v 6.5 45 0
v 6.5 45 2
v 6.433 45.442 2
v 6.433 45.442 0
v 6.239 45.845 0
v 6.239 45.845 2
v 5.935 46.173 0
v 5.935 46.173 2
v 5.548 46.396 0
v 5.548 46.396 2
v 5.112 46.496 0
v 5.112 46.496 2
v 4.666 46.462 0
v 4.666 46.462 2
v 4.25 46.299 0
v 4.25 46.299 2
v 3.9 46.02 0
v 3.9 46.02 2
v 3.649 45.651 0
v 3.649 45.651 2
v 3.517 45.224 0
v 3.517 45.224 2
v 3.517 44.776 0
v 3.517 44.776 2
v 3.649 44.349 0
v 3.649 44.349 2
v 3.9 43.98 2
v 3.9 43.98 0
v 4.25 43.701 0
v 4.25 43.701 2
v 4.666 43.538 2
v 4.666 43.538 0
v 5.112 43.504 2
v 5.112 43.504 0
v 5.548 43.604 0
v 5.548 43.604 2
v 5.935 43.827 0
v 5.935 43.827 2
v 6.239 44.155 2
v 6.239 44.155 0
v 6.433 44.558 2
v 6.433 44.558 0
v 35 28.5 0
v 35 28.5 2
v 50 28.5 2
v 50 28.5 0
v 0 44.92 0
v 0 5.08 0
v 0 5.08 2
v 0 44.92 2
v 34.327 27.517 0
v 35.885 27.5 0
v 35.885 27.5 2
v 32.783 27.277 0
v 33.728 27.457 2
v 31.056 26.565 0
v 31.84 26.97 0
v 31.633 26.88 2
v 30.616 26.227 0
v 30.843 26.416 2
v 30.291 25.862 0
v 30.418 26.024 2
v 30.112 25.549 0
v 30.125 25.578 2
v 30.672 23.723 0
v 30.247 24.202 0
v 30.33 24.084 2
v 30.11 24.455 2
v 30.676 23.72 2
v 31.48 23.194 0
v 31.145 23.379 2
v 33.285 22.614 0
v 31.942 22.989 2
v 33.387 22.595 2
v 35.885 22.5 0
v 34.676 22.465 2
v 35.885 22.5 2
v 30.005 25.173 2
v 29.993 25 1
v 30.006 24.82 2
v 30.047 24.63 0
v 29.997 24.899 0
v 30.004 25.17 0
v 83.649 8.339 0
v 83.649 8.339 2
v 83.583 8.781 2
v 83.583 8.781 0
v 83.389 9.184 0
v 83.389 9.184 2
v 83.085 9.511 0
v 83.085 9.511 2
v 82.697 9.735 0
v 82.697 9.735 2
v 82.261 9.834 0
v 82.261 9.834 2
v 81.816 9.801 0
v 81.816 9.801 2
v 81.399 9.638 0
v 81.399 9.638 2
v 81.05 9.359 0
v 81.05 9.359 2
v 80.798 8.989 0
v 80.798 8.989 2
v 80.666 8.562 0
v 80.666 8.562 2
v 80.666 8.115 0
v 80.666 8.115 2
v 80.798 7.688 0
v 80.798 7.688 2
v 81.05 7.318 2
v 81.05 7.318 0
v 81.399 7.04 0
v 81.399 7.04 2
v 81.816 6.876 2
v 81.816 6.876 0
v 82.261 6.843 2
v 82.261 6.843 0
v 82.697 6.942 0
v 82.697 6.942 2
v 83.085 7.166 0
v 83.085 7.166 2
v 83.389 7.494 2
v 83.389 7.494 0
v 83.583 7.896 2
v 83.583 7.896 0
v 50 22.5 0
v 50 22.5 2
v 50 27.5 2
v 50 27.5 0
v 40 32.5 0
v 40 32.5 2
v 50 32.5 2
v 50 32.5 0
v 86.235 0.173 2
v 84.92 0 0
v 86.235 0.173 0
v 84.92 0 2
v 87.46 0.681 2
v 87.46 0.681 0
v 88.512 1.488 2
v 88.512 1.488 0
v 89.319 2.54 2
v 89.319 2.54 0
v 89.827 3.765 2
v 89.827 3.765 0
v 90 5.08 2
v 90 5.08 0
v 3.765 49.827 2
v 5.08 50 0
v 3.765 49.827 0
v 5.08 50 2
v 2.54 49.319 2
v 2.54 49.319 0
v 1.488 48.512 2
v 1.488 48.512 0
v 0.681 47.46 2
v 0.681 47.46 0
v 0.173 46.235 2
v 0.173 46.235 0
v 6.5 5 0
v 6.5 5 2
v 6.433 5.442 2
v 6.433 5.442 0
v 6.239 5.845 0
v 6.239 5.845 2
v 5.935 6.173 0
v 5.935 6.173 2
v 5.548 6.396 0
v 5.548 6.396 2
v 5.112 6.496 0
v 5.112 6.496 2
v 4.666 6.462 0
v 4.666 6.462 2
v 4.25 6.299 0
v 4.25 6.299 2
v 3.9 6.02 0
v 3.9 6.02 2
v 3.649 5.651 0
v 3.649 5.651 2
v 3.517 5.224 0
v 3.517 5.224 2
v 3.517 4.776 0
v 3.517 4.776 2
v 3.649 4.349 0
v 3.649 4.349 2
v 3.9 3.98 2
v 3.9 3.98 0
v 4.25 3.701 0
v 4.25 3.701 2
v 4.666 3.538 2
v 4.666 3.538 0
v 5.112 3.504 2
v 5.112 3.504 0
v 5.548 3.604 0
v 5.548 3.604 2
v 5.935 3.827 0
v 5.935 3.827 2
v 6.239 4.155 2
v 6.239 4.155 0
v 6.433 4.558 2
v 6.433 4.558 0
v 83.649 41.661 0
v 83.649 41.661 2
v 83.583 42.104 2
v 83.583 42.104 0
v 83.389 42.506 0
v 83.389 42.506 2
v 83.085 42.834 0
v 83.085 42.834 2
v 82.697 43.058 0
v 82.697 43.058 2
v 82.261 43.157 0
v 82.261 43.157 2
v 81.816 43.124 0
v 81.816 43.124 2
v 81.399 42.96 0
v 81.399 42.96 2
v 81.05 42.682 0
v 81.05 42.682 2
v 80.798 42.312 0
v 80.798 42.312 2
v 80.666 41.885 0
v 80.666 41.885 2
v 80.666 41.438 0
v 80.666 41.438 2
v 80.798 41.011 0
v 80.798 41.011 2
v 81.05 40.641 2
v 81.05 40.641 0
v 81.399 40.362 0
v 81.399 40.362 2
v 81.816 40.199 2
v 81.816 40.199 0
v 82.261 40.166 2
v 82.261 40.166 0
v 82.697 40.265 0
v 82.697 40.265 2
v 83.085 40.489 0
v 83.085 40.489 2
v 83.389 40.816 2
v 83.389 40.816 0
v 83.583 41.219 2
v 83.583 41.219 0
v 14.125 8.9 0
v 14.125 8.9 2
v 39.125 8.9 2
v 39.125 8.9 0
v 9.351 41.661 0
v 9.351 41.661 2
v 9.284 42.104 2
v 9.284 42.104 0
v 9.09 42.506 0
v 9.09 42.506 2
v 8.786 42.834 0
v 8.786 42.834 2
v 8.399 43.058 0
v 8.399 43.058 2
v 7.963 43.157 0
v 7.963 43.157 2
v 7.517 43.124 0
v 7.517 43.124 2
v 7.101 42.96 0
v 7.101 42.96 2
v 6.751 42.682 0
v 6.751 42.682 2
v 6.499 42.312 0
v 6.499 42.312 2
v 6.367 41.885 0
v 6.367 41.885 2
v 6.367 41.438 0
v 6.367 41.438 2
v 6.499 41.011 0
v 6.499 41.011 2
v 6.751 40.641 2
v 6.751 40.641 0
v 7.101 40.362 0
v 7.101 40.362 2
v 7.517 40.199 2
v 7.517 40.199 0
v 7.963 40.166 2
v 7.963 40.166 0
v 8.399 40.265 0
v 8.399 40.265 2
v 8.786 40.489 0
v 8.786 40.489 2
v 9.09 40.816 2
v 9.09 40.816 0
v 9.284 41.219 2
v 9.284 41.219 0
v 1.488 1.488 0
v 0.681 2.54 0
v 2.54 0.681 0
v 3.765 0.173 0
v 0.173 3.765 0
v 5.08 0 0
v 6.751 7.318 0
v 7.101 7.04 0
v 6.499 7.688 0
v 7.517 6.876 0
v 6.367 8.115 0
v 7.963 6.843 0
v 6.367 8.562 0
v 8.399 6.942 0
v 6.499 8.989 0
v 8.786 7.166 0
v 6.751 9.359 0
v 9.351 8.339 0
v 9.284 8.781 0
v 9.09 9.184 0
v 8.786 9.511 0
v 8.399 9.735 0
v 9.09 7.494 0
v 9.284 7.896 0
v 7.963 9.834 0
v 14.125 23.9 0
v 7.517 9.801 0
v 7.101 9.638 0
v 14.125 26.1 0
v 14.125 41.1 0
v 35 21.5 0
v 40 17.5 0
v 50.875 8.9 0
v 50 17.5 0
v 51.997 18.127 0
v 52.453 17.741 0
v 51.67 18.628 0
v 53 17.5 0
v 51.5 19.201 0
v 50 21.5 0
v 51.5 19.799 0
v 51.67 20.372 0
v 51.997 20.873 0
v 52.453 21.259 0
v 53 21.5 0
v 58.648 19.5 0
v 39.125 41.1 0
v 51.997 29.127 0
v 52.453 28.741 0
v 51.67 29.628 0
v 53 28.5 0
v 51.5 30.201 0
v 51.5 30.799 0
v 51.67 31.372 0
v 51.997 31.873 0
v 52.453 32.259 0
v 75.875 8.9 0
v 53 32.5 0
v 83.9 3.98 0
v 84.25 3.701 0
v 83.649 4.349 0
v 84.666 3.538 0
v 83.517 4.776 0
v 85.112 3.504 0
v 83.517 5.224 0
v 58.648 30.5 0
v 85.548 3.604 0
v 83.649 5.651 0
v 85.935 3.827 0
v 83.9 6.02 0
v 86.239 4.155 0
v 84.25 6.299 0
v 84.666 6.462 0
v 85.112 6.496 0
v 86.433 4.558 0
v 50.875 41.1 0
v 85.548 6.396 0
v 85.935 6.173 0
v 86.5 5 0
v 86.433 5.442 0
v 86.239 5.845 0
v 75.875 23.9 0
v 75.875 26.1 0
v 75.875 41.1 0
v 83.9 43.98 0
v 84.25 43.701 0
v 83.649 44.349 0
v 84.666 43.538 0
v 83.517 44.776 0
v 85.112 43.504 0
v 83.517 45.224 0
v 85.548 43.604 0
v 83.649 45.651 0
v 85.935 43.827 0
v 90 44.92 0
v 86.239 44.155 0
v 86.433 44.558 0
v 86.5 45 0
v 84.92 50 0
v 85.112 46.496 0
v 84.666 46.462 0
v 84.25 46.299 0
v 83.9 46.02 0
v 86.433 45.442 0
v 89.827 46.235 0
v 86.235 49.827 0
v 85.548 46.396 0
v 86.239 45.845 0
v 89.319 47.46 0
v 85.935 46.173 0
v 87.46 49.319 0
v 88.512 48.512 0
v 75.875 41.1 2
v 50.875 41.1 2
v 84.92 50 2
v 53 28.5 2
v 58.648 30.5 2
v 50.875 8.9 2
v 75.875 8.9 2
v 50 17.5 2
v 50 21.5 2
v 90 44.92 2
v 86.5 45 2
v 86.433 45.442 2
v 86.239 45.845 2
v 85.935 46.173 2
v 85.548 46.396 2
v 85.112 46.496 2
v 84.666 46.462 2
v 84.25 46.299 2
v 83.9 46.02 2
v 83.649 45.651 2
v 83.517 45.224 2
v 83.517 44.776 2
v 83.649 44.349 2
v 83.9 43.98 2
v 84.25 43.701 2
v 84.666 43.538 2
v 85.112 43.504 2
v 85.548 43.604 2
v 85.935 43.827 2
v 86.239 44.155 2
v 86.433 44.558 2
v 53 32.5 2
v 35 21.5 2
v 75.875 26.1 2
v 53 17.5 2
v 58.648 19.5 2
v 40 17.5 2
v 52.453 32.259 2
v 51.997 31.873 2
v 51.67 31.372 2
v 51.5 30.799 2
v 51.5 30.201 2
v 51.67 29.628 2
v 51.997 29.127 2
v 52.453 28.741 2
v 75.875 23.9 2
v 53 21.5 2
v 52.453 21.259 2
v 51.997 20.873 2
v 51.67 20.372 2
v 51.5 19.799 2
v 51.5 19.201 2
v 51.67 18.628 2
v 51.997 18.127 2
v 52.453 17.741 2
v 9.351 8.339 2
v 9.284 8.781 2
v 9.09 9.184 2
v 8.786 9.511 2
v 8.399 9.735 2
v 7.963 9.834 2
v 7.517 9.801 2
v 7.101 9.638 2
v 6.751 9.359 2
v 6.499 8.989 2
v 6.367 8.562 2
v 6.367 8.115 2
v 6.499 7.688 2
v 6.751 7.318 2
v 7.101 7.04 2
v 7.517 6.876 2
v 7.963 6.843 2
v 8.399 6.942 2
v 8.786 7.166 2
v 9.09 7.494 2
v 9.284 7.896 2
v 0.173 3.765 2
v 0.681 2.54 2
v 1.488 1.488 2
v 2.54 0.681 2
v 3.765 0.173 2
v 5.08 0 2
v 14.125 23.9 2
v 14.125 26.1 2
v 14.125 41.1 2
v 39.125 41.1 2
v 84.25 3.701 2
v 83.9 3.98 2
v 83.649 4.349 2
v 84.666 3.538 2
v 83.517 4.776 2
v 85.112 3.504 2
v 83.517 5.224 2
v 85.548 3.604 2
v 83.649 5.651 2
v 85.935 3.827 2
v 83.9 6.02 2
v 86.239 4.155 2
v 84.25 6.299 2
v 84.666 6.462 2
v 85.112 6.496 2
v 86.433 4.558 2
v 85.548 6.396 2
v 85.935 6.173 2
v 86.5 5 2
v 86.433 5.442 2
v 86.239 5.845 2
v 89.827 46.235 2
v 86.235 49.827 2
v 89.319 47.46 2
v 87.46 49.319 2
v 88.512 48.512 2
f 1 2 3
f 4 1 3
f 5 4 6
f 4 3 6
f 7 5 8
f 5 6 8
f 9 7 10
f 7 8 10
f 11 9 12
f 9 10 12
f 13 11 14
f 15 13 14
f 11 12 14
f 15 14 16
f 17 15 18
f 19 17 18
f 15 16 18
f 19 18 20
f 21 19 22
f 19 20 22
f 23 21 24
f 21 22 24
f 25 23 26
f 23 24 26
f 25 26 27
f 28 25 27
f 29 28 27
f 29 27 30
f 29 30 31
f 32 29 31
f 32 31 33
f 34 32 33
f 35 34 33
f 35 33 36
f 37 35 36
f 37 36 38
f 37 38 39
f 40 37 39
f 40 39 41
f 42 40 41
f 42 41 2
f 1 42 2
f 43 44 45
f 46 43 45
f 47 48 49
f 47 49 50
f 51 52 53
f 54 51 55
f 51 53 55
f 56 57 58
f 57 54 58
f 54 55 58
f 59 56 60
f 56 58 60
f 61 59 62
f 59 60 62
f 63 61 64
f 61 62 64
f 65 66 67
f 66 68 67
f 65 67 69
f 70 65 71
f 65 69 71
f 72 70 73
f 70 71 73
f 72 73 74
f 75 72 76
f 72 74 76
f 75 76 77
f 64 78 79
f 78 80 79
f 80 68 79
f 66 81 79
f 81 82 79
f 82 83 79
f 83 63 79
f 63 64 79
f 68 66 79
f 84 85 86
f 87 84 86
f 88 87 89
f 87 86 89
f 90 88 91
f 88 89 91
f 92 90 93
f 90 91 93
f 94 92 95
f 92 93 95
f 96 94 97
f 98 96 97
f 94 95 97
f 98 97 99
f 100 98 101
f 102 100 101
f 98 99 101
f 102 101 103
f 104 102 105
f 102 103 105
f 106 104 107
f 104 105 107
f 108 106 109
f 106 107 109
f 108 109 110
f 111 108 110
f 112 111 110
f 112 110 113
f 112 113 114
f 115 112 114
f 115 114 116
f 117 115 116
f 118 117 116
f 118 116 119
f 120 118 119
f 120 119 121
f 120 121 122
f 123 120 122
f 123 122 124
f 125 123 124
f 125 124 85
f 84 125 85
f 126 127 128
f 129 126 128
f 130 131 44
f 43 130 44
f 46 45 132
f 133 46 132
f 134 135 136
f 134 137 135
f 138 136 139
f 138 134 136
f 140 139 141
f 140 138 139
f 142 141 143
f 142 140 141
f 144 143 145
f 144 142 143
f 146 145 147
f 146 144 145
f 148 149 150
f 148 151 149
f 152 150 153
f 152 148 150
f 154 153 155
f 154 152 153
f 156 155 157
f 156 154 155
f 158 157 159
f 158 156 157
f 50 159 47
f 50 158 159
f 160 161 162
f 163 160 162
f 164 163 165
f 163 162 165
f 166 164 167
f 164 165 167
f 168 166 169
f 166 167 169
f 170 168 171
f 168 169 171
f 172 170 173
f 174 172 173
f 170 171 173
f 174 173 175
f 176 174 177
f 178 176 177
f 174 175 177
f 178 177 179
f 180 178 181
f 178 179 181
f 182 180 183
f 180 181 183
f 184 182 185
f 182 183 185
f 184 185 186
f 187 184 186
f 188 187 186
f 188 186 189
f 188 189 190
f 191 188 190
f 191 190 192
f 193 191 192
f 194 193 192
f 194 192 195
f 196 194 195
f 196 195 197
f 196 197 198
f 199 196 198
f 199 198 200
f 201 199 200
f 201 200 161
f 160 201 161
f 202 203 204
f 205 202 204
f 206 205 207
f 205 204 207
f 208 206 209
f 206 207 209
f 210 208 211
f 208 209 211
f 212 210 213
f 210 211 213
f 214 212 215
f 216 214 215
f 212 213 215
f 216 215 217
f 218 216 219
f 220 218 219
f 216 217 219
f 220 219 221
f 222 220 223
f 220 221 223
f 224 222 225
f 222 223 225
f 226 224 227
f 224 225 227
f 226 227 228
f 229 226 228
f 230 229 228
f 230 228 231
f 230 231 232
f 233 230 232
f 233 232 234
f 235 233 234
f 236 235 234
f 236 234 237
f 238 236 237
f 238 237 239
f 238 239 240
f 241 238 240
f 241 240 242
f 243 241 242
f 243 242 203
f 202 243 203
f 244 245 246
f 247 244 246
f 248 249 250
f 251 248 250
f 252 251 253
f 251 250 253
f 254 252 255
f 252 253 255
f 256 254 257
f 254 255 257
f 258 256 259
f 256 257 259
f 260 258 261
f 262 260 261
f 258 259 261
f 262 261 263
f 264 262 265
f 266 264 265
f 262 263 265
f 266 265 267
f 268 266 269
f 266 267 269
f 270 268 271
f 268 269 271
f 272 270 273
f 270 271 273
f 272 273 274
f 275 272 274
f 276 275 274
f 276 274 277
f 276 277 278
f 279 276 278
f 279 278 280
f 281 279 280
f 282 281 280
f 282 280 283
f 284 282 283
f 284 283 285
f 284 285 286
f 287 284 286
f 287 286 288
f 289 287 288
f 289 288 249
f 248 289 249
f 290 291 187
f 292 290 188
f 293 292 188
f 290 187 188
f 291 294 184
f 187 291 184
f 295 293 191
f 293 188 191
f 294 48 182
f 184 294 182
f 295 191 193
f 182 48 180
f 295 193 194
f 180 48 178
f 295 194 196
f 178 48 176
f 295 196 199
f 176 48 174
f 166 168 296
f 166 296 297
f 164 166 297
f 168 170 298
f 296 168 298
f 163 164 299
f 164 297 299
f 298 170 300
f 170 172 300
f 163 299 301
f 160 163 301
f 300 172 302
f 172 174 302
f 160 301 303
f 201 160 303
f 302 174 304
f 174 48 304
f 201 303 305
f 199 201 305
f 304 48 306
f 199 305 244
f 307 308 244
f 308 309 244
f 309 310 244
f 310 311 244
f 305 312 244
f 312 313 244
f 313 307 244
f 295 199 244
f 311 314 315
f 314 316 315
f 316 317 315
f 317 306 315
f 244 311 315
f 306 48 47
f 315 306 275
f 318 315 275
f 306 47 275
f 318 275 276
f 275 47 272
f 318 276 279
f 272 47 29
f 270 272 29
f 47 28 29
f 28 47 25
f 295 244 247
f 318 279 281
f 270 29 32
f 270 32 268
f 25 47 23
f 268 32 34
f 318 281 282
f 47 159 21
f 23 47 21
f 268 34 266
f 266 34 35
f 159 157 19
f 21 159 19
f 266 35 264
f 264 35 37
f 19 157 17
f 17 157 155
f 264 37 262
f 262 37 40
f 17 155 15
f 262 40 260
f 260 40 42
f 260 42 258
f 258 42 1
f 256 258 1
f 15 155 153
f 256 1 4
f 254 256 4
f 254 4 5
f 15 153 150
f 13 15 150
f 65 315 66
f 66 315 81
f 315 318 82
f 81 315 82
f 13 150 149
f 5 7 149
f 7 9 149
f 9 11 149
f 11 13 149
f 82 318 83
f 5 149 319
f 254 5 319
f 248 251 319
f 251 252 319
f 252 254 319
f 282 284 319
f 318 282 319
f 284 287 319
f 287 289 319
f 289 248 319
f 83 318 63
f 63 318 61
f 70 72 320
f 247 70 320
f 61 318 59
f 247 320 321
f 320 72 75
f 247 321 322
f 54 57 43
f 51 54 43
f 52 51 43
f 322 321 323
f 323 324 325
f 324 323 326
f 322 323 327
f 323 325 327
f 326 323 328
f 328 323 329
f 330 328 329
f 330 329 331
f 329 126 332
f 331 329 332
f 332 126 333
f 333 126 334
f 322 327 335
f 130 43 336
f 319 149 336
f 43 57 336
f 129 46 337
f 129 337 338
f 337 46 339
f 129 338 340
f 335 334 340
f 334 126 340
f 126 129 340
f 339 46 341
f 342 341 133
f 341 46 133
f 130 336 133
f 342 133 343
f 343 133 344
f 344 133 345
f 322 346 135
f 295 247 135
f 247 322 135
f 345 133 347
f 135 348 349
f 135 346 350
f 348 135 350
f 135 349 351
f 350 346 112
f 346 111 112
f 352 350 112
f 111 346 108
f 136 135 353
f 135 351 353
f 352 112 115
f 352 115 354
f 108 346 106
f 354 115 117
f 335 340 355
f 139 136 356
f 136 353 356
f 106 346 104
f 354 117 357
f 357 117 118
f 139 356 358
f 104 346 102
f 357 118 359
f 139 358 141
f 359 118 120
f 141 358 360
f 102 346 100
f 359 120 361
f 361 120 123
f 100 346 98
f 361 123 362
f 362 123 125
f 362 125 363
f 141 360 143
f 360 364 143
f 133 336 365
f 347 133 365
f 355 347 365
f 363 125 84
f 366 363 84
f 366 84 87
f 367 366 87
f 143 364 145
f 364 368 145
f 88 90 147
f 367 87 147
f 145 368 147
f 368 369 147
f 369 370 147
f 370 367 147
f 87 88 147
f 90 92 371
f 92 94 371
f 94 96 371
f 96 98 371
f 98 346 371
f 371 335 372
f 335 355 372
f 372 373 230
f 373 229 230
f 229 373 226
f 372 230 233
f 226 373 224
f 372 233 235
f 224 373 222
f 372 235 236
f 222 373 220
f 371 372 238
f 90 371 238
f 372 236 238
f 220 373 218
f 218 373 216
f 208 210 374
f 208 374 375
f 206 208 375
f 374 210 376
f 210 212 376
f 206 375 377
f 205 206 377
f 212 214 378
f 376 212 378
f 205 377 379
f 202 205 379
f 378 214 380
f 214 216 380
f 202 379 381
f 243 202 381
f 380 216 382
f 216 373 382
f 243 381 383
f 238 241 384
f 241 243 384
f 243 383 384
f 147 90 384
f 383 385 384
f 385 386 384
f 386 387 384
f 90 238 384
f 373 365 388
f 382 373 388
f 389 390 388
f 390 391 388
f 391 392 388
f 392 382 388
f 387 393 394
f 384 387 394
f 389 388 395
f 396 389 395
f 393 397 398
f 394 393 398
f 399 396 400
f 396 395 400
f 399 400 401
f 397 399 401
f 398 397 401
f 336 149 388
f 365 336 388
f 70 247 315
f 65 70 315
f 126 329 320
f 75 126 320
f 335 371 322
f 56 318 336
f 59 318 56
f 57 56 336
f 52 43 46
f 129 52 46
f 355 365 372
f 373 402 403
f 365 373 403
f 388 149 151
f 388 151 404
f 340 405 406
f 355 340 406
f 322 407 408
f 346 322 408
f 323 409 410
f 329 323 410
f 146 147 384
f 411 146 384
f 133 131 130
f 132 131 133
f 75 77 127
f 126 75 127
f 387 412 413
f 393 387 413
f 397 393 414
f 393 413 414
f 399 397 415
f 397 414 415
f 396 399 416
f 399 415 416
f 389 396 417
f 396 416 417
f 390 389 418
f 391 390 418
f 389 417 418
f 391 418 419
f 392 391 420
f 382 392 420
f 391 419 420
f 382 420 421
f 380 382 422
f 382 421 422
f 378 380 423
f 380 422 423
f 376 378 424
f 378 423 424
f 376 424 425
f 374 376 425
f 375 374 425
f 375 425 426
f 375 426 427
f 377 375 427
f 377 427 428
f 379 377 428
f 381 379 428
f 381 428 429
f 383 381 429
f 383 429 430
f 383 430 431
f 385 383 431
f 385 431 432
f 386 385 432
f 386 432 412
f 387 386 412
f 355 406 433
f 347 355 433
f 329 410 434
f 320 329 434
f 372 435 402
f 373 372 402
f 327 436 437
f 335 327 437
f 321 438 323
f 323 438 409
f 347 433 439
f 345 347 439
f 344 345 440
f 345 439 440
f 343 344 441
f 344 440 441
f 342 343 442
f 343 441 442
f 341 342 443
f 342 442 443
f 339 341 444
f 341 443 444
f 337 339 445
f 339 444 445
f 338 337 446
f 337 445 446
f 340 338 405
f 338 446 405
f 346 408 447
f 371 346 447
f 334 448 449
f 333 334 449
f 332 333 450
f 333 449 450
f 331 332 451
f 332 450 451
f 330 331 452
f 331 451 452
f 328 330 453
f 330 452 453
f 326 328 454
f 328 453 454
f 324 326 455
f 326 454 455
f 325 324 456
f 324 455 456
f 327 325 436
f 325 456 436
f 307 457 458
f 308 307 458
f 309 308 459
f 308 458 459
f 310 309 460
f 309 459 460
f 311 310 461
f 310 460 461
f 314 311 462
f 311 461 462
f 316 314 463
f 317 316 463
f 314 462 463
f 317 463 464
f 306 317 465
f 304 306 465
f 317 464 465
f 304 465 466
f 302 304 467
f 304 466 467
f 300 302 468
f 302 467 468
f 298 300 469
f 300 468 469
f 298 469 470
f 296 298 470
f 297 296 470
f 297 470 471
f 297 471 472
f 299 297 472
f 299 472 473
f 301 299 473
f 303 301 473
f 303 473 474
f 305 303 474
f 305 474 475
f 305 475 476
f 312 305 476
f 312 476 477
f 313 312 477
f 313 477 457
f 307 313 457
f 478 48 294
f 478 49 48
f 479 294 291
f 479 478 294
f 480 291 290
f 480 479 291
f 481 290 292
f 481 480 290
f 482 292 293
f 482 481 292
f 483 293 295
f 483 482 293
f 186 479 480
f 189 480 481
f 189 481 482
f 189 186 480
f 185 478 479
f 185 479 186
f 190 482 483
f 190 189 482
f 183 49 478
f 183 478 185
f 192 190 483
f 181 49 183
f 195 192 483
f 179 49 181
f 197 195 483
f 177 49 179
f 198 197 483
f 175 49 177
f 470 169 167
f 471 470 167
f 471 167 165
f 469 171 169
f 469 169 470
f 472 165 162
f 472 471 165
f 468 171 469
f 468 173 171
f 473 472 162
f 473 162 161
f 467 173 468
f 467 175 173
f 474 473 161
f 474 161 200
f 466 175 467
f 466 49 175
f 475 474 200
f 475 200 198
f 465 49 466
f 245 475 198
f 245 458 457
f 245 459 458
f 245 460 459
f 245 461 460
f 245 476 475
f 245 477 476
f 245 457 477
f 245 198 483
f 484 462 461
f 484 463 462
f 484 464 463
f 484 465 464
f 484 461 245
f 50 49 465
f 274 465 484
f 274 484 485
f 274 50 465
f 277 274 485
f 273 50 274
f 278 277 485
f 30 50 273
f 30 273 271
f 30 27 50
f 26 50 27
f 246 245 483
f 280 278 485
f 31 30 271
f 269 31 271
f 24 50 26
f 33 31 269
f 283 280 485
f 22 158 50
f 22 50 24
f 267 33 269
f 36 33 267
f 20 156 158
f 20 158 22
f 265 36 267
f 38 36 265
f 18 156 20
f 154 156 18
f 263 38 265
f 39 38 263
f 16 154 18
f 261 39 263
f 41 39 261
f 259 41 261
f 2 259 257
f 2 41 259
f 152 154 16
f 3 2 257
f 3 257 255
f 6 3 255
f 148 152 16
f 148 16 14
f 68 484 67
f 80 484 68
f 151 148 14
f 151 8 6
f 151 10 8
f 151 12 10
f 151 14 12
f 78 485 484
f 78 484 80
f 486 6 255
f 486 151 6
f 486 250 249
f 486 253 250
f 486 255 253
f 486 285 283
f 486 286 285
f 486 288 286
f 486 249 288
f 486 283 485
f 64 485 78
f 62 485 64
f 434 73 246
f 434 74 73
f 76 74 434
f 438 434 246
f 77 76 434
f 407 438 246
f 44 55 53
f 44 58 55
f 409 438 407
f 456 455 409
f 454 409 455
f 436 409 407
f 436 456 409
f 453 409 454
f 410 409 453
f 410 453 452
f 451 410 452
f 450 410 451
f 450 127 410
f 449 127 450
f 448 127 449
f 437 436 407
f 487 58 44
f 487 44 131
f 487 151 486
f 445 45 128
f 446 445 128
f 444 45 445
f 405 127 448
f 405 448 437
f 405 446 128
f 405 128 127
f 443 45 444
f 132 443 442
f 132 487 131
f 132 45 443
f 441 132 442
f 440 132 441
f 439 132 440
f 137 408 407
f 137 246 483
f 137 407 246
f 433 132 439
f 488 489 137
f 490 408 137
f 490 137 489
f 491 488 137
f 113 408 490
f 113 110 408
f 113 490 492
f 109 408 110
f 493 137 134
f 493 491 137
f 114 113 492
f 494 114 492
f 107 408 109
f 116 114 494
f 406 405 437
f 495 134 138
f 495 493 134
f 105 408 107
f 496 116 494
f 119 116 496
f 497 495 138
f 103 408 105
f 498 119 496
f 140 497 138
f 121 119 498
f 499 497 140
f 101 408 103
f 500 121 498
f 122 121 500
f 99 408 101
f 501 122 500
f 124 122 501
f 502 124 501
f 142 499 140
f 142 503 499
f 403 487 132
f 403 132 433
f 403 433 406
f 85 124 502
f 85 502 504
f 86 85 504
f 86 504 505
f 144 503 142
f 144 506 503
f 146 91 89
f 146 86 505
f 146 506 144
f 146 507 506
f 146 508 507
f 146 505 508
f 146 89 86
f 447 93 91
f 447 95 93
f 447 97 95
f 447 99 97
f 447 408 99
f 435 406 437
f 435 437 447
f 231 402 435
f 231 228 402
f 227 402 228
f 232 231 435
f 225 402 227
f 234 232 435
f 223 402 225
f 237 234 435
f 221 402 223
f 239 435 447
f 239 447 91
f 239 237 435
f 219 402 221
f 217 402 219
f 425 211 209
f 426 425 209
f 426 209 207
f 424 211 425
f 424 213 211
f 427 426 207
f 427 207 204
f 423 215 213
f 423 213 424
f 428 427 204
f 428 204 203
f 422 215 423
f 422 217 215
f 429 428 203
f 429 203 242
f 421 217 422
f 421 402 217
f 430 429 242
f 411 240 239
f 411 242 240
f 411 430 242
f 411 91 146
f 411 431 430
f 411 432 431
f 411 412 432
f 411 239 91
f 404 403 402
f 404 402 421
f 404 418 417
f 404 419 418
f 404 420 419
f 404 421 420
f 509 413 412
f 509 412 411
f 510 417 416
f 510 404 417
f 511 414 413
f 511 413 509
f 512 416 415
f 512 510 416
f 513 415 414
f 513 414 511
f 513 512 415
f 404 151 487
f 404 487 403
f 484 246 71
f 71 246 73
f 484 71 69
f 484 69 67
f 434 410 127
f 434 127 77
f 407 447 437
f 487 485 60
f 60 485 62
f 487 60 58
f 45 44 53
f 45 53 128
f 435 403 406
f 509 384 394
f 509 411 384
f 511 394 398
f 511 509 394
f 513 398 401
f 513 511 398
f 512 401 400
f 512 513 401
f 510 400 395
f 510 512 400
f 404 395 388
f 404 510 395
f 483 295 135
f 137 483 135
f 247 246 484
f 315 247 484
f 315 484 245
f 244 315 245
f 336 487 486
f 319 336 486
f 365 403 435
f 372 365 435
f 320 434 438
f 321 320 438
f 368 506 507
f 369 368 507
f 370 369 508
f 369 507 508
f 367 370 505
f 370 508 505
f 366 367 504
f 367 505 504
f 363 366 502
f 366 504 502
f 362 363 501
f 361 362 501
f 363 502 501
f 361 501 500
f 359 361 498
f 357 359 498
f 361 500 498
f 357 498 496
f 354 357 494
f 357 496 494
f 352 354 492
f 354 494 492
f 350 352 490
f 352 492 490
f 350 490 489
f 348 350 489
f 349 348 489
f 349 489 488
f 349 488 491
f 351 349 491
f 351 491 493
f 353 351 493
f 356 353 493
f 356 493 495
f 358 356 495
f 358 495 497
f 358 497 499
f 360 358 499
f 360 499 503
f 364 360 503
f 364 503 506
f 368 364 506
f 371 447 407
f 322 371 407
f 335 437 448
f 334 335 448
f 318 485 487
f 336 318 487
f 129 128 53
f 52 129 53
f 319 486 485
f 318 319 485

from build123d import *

# Parameters (mm, degrees)
F0_W      = 90
F0_H      = 50
F1_DEPTH  = 2
F3_R      = 5.08
F4_R      = 5.08
F5_R      = 5.08
F6_R      = 5.08
F8_R      = 1.5
F9_DEPTH  = 25.4
F10_W     = 10
F10_H     = 4
F11_DEPTH = 25.4
F13_DEPTH = 25.4


with BuildPart() as f1:
    # F0 (on Top) → F1 (new body)
    with BuildSketch(Plane.XY):
        with Locations((45, 25)):
            Rectangle(F0_W, F0_H)
    extrude(amount=F1_DEPTH)

    # F3
    f3_edges = [f1.edges().sort_by_distance(p)[0] for p in [
        (90, 0, 1),
    ]]
    fillet(f3_edges, radius=F3_R)

    # F4
    f4_edges = [f1.edges().sort_by_distance(p)[0] for p in [
        (90, 50, 1),
    ]]
    fillet(f4_edges, radius=F4_R)

    # F5
    f5_edges = [f1.edges().sort_by_distance(p)[0] for p in [
        (0, 50, 1),
    ]]
    fillet(f5_edges, radius=F5_R)

    # F6
    f6_edges = [f1.edges().sort_by_distance(p)[0] for p in [
        (0, 0, 1),
    ]]
    fillet(f6_edges, radius=F6_R)

    # F8 (on offset) → F9 (cut)
    with BuildSketch(Plane.XY.offset(2)):
        with Locations((85, 5)):
            Circle(F8_R)
        with Locations((82.1494022449, 8.3385913854)):
            Circle(F8_R)
        with Locations((82.1494022449, 41.6614086146)):
            Circle(F8_R)
        with Locations((85, 45)):
            Circle(F8_R)
        with Locations((7.8505977551, 41.6614086146)):
            Circle(F8_R)
        with Locations((5, 45)):
            Circle(F8_R)
        with Locations((7.8505977551, 8.3385913854)):
            Circle(F8_R)
        with Locations((5, 5)):
            Circle(F8_R)
    extrude(amount=-F9_DEPTH, mode=Mode.SUBTRACT)

    # F10 (on offset) → F11 (cut)
    with BuildSketch(Plane.XY.offset(2)):
        with BuildLine():
            Line((35, 22.5), (35, 27.5))
            Line((35, 27.5), (35.8850657517, 27.5))
            add(Edge.make_bspline(
                [(35.8850657517, 27.5), (29.9931568267, 28.0368228686), (29.9931568267, 25)],
                knots=[4.5346839474, 4.5346839474, 4.5346839474, 6.2831853072, 6.2831853072, 6.2831853072], degree=2, weights=[1, 0.6415718139, 1]))
            add(Edge.make_bspline(
                [(29.9931568267, 25), (29.9931568267, 21.9631771314), (35.8850657517, 22.5)],
                knots=[0, 0, 0, 1.7485013598, 1.7485013598, 1.7485013598], degree=2, weights=[1, 0.6415718139, 1]))
            Line((35.8850657517, 22.5), (35, 22.5))
        make_face()
        with BuildLine():
            Line((35.8850657517, 27.5), (35, 27.5))
            Line((35, 27.5), (35, 22.5))
            Line((35, 22.5), (35.8850657517, 22.5))
            add(Edge.make_bspline(
                [(35.8850657517, 22.5), (40.0068431733, 22.8755428686), (40.0068431733, 25), (40.0068431733, 27.1244571314), (35.8850657517, 27.5)],
                knots=[1.7485013598, 1.7485013598, 1.7485013598, 3.1415926536, 3.1415926536, 4.5346839474, 4.5346839474, 4.5346839474], degree=2, weights=[1, 0.767062975, 1, 0.767062975, 1]))
        make_face()
        with BuildLine():
            Line((50, 27.5), (35.8850657517, 27.5))
            add(Edge.make_bspline(
                [(35.8850657517, 22.5), (40.0068431733, 22.8755428686), (40.0068431733, 25), (40.0068431733, 27.1244571314), (35.8850657517, 27.5)],
                knots=[1.7485013598, 1.7485013598, 1.7485013598, 3.1415926536, 3.1415926536, 4.5346839474, 4.5346839474, 4.5346839474], degree=2, weights=[1, 0.767062975, 1, 0.767062975, 1]))
            Line((35.8850657517, 22.5), (50, 22.5))
            Line((50, 22.5), (50, 27.5))
        make_face()
        with Locations((45, 30.5)):
            Rectangle(F10_W, F10_H)
        Polygon((40, 28.5), (40, 32.5), (35, 28.5), align=None)
        Polygon((35, 21.5), (40, 17.5), (40, 21.5), align=None)
        with Locations((45, 19.5)):
            Rectangle(F10_W, F10_H)
        with BuildLine():
            Line((58.6482731998, 30.5), (53, 32.5))
            ThreePointArc((53, 32.5), (51.4781820371, 30.5), (53, 28.5))
            Line((53, 28.5), (58.6482731998, 30.5))
        make_face()
        with BuildLine():
            ThreePointArc((53, 21.5), (51.4781820371, 19.5), (53, 17.5))
            Line((53, 17.5), (58.6482731998, 19.5))
            Line((58.6482731998, 19.5), (53, 21.5))
        make_face()
    extrude(amount=-F11_DEPTH, mode=Mode.SUBTRACT)

    # F12 (on offset) → F13 (cut)
    with BuildSketch(Plane.XY.offset(2)):
        Polygon((75.8748404465, 23.8996903335), (50.8748404465, 8.8996903335), (75.8748404465, 8.8996903335), align=None)
        Polygon((50.8748404465, 41.1003096665), (75.8748404465, 26.1003096665), (75.8748404465, 41.1003096665), align=None)
        Polygon((14.1251595535, 26.1003096665), (39.1251595535, 41.1003096665), (14.1251595535, 41.1003096665), align=None)
        Polygon((39.1251595535, 8.8996903335), (14.1251595535, 23.8996903335), (14.1251595535, 8.8996903335), align=None)
    extrude(amount=-F13_DEPTH, mode=Mode.SUBTRACT)


solid = f1.part
